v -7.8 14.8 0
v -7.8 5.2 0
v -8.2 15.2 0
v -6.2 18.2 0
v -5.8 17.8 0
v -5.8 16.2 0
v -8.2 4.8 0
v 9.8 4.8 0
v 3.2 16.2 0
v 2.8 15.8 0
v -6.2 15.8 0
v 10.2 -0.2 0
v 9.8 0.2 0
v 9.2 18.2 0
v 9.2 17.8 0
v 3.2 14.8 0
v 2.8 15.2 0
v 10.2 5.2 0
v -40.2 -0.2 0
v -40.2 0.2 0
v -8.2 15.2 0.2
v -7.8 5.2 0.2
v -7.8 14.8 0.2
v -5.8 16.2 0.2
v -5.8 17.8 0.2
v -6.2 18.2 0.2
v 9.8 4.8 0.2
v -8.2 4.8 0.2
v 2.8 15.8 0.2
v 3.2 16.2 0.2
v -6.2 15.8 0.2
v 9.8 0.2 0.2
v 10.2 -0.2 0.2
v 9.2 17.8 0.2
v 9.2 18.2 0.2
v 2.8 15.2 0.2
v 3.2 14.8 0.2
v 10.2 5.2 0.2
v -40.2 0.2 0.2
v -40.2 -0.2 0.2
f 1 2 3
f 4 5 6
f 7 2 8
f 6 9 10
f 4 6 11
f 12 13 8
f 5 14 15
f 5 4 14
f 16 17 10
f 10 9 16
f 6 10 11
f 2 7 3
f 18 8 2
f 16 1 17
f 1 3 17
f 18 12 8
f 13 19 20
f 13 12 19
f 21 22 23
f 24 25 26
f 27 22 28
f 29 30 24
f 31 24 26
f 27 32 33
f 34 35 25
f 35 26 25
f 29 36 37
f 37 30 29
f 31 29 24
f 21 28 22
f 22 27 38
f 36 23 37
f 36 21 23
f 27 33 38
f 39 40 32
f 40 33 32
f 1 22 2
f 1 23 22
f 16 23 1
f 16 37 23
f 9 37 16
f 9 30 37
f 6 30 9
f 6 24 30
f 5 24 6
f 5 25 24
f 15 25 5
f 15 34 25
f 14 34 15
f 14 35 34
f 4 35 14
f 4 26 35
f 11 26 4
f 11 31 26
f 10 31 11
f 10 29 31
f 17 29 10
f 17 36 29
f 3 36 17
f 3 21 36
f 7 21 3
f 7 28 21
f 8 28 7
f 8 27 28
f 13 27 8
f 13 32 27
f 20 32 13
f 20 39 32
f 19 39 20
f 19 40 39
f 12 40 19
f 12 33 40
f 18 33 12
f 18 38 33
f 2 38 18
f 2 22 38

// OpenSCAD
// file: ../../api/v2/reporting.scad
//////////////////////////////////////////////////////////////////////
// LibFile: reporting.scad
// Project: Grid Stack
// FileGroup: API v2 Reporting
// FileSummary: Console report for immutable primitive-trace print recipes.
// Role: Makes the exact material, nozzle, printer status, layer height,
//       trace lengths, repeat distances, and source identity visible.
// Requires: API v2 indexes and parallel-trace/path helpers.
// Exports: report_first_layer_object().
//////////////////////////////////////////////////////////////////////

module report_first_layer_object(object, report_level = "full") {
    material = object[FLO_MATERIAL];
    nozzle = object[FLO_NOZZLE];
    printer = object[FLO_PRINTER];
    process = object[FLO_PROCESS];
    traces = object[FLO_TRACES];
    orientation = object[FLO_ORIENTATION];
    lead_in = object[FLO_LEAD_IN];
    points = parallel_trace_path(traces, orientation, lead_in);

    assert(report_level == "summary" || report_level == "full",
        "Report level must be summary or full.");

    echo("------------------------------------------------------------");
    echo("GRID STACK API V2 SAVED FIRST-LAYER OBJECT");
    echo(str("Object: ", object[FLO_NAME]));
    echo(str("Revision: ", object[FLO_REVISION]));
    echo(str("Source release: ", object[FLO_SOURCE_RELEASE]));
    echo(str("Source commit: ", object[FLO_SOURCE_COMMIT]));
    echo(str("Status: ", object[FLO_STATUS]));
    echo(str("Material: ", material[MAT_FAMILY]));
    echo(str("Nozzle: ", nozzle[NZ_DIAMETER], " mm"));
    echo(str("Layer height: ", process[TP_LAYER_H], " mm"));
    echo(str("Printer record: ", printer[PRN_NAME],
        " (", printer[PRN_STATUS], ")"));
    echo(str("Trace orientation: ", orientation, " degrees"));
    echo(str("Trace count: ", len(traces)));
    echo(str("Trace lengths: ", parallel_trace_lengths(traces)));
    echo(str("Repeat distances: ", trace_repeat_distances(traces)));
    echo(str("Clear gaps: ",
        trace_clear_gaps(traces, nozzle[NZ_DIAMETER])));
    echo(str("Lead-in: ", lead_in, " mm"));
    echo(str("Continuous path length: ", path_length(points), " mm"));

    if (report_level == "full") {
        echo(str("Material record: ", material));
        echo(str("Nozzle record: ", nozzle));
        echo(str("Printer record: ", printer));
        echo(str("Trace-process record: ", process));
        echo(str("Trace records: ", traces));
        echo(str("Ordered path: ", points));
        echo(str("Notes: ", object[FLO_NOTES]));
    }

    echo("------------------------------------------------------------");
}
// file: ../../api/v2/validation.scad
//////////////////////////////////////////////////////////////////////
// LibFile: validation.scad
// Project: Grid Stack
// FileGroup: API v2 Validation
// FileSummary: Validates immutable primitive-trace print recipes.
// Role: Rejects incomplete environments, nonparallel traces, diagonal turns,
//       incompatible API/schema versions, and misleading print records.
// Requires: API v2 indexes, path math, and parallel-trace helpers.
// Exports: validate_first_layer_object().
//////////////////////////////////////////////////////////////////////

function _v2_is_integer(value) = is_num(value) && floor(value) == value;

module _validate_material(material) {
    assert(len(material) == 5,
        "API v2 material record has an unexpected field count.");
    assert(material[MAT_NAME] != "", "Material name cannot be empty.");
    assert(material[MAT_STATUS] == "in_use" ||
           material[MAT_STATUS] == "retired",
        "Material status must be in_use or retired.");
}

module _validate_nozzle(nozzle) {
    assert(len(nozzle) == 5,
        "API v2 nozzle record has an unexpected field count.");
    assert(nozzle[NZ_NAME] != "", "Nozzle name cannot be empty.");
    assert(nozzle[NZ_DIAMETER] > 0,
        "Nozzle diameter must be positive.");
    assert(nozzle[NZ_STATUS] == "in_use" ||
           nozzle[NZ_STATUS] == "retired",
        "Nozzle status must be in_use or retired.");
}

module _validate_printer(printer) {
    assert(len(printer) == 7,
        "API v2 printer record has an unexpected field count.");
    assert(printer[PRN_NAME] != "", "Printer name cannot be empty.");
    assert(printer[PRN_STATUS] == "recorded" ||
           printer[PRN_STATUS] == "unrecorded" ||
           printer[PRN_STATUS] == "retired",
        "Printer status must be recorded, unrecorded, or retired.");

    if (printer[PRN_STATUS] == "recorded") {
        assert(printer[PRN_MANUFACTURER] != "",
            "A recorded printer requires a manufacturer.");
        assert(printer[PRN_MODEL] != "",
            "A recorded printer requires a model.");
    }
}

module _validate_trace_process(process, material, nozzle, printer) {
    assert(len(process) == 8,
        "API v2 trace-process record has an unexpected field count.");
    assert(process[TP_NAME] != "",
        "Trace-process name cannot be empty.");
    assert(process[TP_MATERIAL] == material[MAT_NAME],
        "Trace process material does not match the embedded material.");
    assert(process[TP_NOZZLE] == nozzle[NZ_NAME],
        "Trace process nozzle does not match the embedded nozzle.");
    assert(process[TP_PRINTER] == printer[PRN_NAME],
        "Trace process printer does not match the embedded printer.");
    assert(process[TP_LAYER_H] > 0,
        "Deposited layer height must be positive.");
    assert(process[TP_LAYER_H] <= nozzle[NZ_DIAMETER],
        "Deposited layer height must not exceed nozzle diameter.");
    assert(process[TP_QUALIFICATION] == "owner_tested" ||
           process[TP_QUALIFICATION] == "unqualified",
        "Trace-process qualification must be owner_tested or unqualified.");
    assert(_v2_is_integer(process[TP_REVISION]) &&
           process[TP_REVISION] >= 1,
        "Trace-process revision must be a positive integer.");
}

module _validate_parallel_traces(traces, orientation, trace_width, lead_in) {
    assert(len(traces) >= 1,
        "At least one parallel trace must be configured.");
    assert(orientation == 0 || orientation == 90,
        "Trace orientation must be 0 or 90 degrees.");
    assert(trace_width > 0,
        "Trace width must be positive.");
    assert(lead_in >= 0,
        "Lead-in must be zero or positive.");

    for (i = [0 : len(traces) - 1]) {
        trace = traces[i];
        assert(len(trace) == 3,
            str("Trace ", i,
                " must be [axis_min, axis_max, perpendicular_position]."));
        assert(is_num(trace[PTR_AXIS_MIN]) &&
               is_num(trace[PTR_AXIS_MAX]) &&
               is_num(trace[PTR_OFFSET]),
            str("Trace ", i, " fields must be numeric."));
        assert(trace[PTR_AXIS_MAX] > trace[PTR_AXIS_MIN],
            str("Trace ", i,
                " axis_max must be greater than axis_min."));
    }

    if (len(traces) >= 2) {
        offset_direction = traces[1][PTR_OFFSET] > traces[0][PTR_OFFSET]
            ? 1 : -1;

        for (i = [0 : len(traces) - 2]) {
            repeat_distance = abs(
                traces[i + 1][PTR_OFFSET] - traces[i][PTR_OFFSET]
            );
            next_direction = traces[i + 1][PTR_OFFSET] -
                             traces[i][PTR_OFFSET];

            assert(next_direction * offset_direction > 0,
                "Parallel-trace offsets must remain strictly monotonic.");
            assert(repeat_distance >= trace_width,
                str("Trace repeat distance ", repeat_distance,
                    " is smaller than trace width ", trace_width, "."));
            assert(nearly_equal(
                    trace_path_end_axis(traces[i], i),
                    trace_path_start_axis(traces[i + 1], i + 1)
                ),
                str("Traces ", i, " and ", i + 1,
                    " do not share the endpoint required for a square turn."));
        }
    }

    points = parallel_trace_path(traces, orientation, lead_in);
    assert(len(points) >= 2,
        "Generated path requires at least two points.");
    assert(!path_has_zero_length_segment(points),
        "Generated path contains a zero-length segment.");
    assert(path_is_axis_aligned(points),
        "Generated path must remain axis-aligned.");
    assert(path_start(points) != path_end(points),
        "Generated path must remain open.");
}

// Module: validate_first_layer_object()
// Synopsis: Validates one API v2 immutable first-layer recipe.
module validate_first_layer_object(object) {
    assert(len(object) == 15,
        "API v2 first-layer object has an unexpected field count.");
    assert(object[FLO_NAME] != "",
        "First-layer object name must not be empty.");
    assert(_v2_is_integer(object[FLO_REVISION]) &&
           object[FLO_REVISION] >= 1,
        "First-layer object revision must be a positive integer.");
    assert(object[FLO_REQUIRED_API] == GRID_STACK_API_VERSION,
        str("Recipe requires Grid Stack API ",
            object[FLO_REQUIRED_API], " but loaded API is ",
            GRID_STACK_API_VERSION, "."));
    assert(object[FLO_SCHEMA_VERSION] ==
           GRID_STACK_FIRST_LAYER_SCHEMA_VERSION,
        str("Recipe schema ", object[FLO_SCHEMA_VERSION],
            " is incompatible with loaded schema ",
            GRID_STACK_FIRST_LAYER_SCHEMA_VERSION, "."));
    assert(object[FLO_SOURCE_RELEASE] != "",
        "Recipe must record its source release.");
    assert(object[FLO_SOURCE_COMMIT] != "",
        "Recipe must record its accepted source commit.");
    assert(object[FLO_STATUS] == "calibration" ||
           object[FLO_STATUS] == "printed" ||
           object[FLO_STATUS] == "retired",
        "Recipe status must be calibration, printed, or retired.");

    material = object[FLO_MATERIAL];
    nozzle = object[FLO_NOZZLE];
    printer = object[FLO_PRINTER];
    process = object[FLO_PROCESS];

    _validate_material(material);
    _validate_nozzle(nozzle);
    _validate_printer(printer);
    _validate_trace_process(process, material, nozzle, printer);
    _validate_parallel_traces(
        object[FLO_TRACES],
        object[FLO_ORIENTATION],
        nozzle[NZ_DIAMETER],
        object[FLO_LEAD_IN]
    );

    if (object[FLO_STATUS] == "printed")
        assert(process[TP_QUALIFICATION] == "owner_tested",
            "A printed recipe must use an owner-tested trace process.");

    echo("GRID STACK API V2 FIRST-LAYER VALIDATION: PASS");
}
// file: ../../geometry/trace_layer.scad
//////////////////////////////////////////////////////////////////////
// LibFile: trace_layer.scad
// Project: Grid Stack
// FileGroup: Printable Geometry
// FileSummary: Sweeps one rectangular nozzle trace along an axis-aligned path
//              using square segment ends and square perpendicular turns.
// Role: Creates the first printable Grid Stack primitive: one trace wide and
//       one deposited layer high. It is not a structural strand.
// Requires: An ordered, validated, axis-aligned XY point list.
// Exports: square_trace_path_2d() and printable_trace_layer().
//////////////////////////////////////////////////////////////////////

// Module: _square_trace_segment_2d()
// Synopsis: Creates one centered axis-aligned segment with square end caps.
module _square_trace_segment_2d(a, b, width) {
    horizontal = nearly_equal(a[1], b[1]);
    vertical = nearly_equal(a[0], b[0]);

    assert(horizontal || vertical,
        "Printable trace segments must be horizontal or vertical.");
    assert(!nearly_equal(point_distance_2d(a, b), 0),
        "Printable trace segments must have nonzero length.");

    if (horizontal)
        translate([min(a[0], b[0]) - width / 2, a[1] - width / 2])
            square([abs(b[0] - a[0]) + width, width]);
    else
        translate([a[0] - width / 2, min(a[1], b[1]) - width / 2])
            square([width, abs(b[1] - a[1]) + width]);
}

// Module: square_trace_path_2d()
// Synopsis: Unions square-ended segments into one continuous 2D trace.
module square_trace_path_2d(points, width) {
    assert(len(points) >= 2,
        "A printable trace path requires at least two points.");
    assert(width > 0,
        "Printable trace width must be positive.");

    union()
        for (i = [0 : len(points) - 2])
            _square_trace_segment_2d(points[i], points[i + 1], width);
}

// Module: printable_trace_layer()
// Synopsis: Extrudes one trace-width path to one deposited-layer height.
// Description:
//   The start, termination, and every perpendicular turn remain square.
//   This primitive intentionally represents one nozzle trace and one layer.
module printable_trace_layer(points, trace_width, trace_height) {
    assert(trace_height > 0,
        "Printable trace height must be positive.");

    linear_extrude(height = trace_height, convexity = 10)
        square_trace_path_2d(points, trace_width);
}
// file: ../../geometry/path_preview.scad
//////////////////////////////////////////////////////////////////////
// LibFile: path_preview.scad
// Project: Grid Stack
// FileGroup: Diagnostic Geometry
// FileSummary: Displays an ordered centerline, point order, start/end markers,
//              and the non-printing coupon envelope.
// Role: Supports path inspection only. It is not structural-strand geometry.
// Requires: An ordered list of XY points.
// Exports: diagnostic_path_preview().
//////////////////////////////////////////////////////////////////////

module _preview_segment_2d(a, b, width) {
    hull() {
        translate(a) circle(d = width, $fn = 16);
        translate(b) circle(d = width, $fn = 16);
    }
}

module _preview_polyline_2d(points, width) {
    for (i = [0 : len(points) - 2])
        _preview_segment_2d(points[i], points[i + 1], width);
}

module _preview_point_label(point, index, label_size) {
    translate([point[0] + label_size * 0.35, point[1] + label_size * 0.15])
        text(str(index), size = label_size, halign = "left", valign = "bottom");
}

// Module: diagnostic_path_preview()
// Synopsis: Renders a deliberately thin, non-printable path diagnostic.
// Description:
//   Point 0 is the lead-in start. The last point is the only path end.
//   The translucent rectangle is an envelope reference, not a perimeter path.
module diagnostic_path_preview(
    points,
    boundary_size,
    show_envelope = true,
    show_point_numbers = true,
    line_width = 0.18,
    marker_diameter = 1.2,
    label_size = 1.5
) {
    if (show_envelope)
        %color([0.75, 0.75, 0.75, 0.25])
            linear_extrude(height = 0.02)
                square(boundary_size);

    color("orange")
        linear_extrude(height = 0.08)
            _preview_polyline_2d(points, line_width);

    color("green")
        translate([points[0][0], points[0][1], 0])
            cylinder(h = 0.12, d = marker_diameter, $fn = 24);

    color("red")
        translate([points[len(points) - 1][0], points[len(points) - 1][1], 0])
            cylinder(h = 0.12, d = marker_diameter, $fn = 24);

    if (show_point_numbers)
        color("black")
            linear_extrude(height = 0.1)
                for (i = [0 : len(points) - 1])
                    _preview_point_label(points[i], i, label_size);
}
// file: ../../paths/parallel_traces.scad
//////////////////////////////////////////////////////////////////////
// LibFile: parallel_traces.scad
// Project: Grid Stack
// FileGroup: Path Generation
// FileSummary: Converts configurable parallel-trace records into one ordered,
//              continuous path with square perpendicular connectors.
// Role: Treats every trace length and repeat distance as independent data.
//       No equal spacing, equal length, symmetry, or square-wave repetition is
//       implied by this generator.
// Requires: Path mathematics and parallel-trace field indexes.
// Exports: parallel_trace_path(), trace_axis_length(), trace_repeat_distances(),
//          trace_clear_gaps(), and trace-path endpoint helpers.
//////////////////////////////////////////////////////////////////////

// Function: trace_axis_length()
// Synopsis: Returns the independently configured length of one parallel trace.
function trace_axis_length(trace) = trace[PTR_AXIS_MAX] - trace[PTR_AXIS_MIN];

// Function: trace_path_start_axis()
// Synopsis: Returns the traversal start coordinate for a trace by parity.
// Description:
//   Even traces run from axis_min to axis_max. Odd traces run from axis_max
//   to axis_min. This alternation preserves one continuous serpentine path.
function trace_path_start_axis(trace, index) =
    index % 2 == 0 ? trace[PTR_AXIS_MIN] : trace[PTR_AXIS_MAX];

// Function: trace_path_end_axis()
// Synopsis: Returns the traversal end coordinate for a trace by parity.
function trace_path_end_axis(trace, index) =
    index % 2 == 0 ? trace[PTR_AXIS_MAX] : trace[PTR_AXIS_MIN];

// Function: _parallel_trace_point()
// Synopsis: Maps one axis coordinate and one perpendicular offset into XY.
function _parallel_trace_point(axis_value, offset, orientation) =
    orientation == 0 ? [axis_value, offset] : [offset, axis_value];

// Function: _parallel_trace_points()
// Synopsis: Recursively expands trace records into entry and exit points.
function _parallel_trace_points(traces, orientation, index = 0) =
    index >= len(traces)
        ? []
        : let(
            trace = traces[index],
            offset = trace[PTR_OFFSET],
            start_point = _parallel_trace_point(
                trace_path_start_axis(trace, index), offset, orientation
            ),
            end_point = _parallel_trace_point(
                trace_path_end_axis(trace, index), offset, orientation
            )
        )
        concat(
            [start_point, end_point],
            _parallel_trace_points(traces, orientation, index + 1)
        );

// Function: parallel_trace_path()
// Synopsis: Returns one open ordered path through all configured traces.
// Arguments:
//   traces = Records of [axis_min, axis_max, perpendicular_position].
//   orientation = 0 for X-running traces or 90 for Y-running traces.
//   lead_in = Straight entry length before the first trace, in millimeters.
// Description:
//   Adjacent records must share the alternating endpoint used by their turn.
//   The path therefore connects traces only with perpendicular square turns.
//   Every trace length and every offset difference may be different.
function parallel_trace_path(traces, orientation = 0, lead_in = 0) =
    assert(len(traces) >= 1,
        "A parallel-trace path requires at least one trace record.")
    assert(orientation == 0 || orientation == 90,
        "Parallel-trace orientation must be 0 or 90 degrees.")
    assert(lead_in >= 0,
        "Parallel-trace lead-in must be zero or positive.")
    let(
        body = _parallel_trace_points(traces, orientation),
        first = body[0],
        lead_start = orientation == 0
            ? [first[0] - lead_in, first[1]]
            : [first[0], first[1] - lead_in]
    )
    lead_in > 0 ? concat([lead_start], body) : body;

// Function: trace_repeat_distances()
// Synopsis: Returns centerline-to-centerline repeat distances between traces.
function trace_repeat_distances(traces) =
    len(traces) < 2
        ? []
        : [for (i = [0 : len(traces) - 2])
            abs(traces[i + 1][PTR_OFFSET] - traces[i][PTR_OFFSET])];

// Function: trace_clear_gaps()
// Synopsis: Returns clear edge-to-edge gaps for a specified trace width.
function trace_clear_gaps(traces, trace_width) =
    [for (distance = trace_repeat_distances(traces))
        distance - trace_width];

// Function: parallel_trace_lengths()
// Synopsis: Returns the independently configured lengths of all traces.
function parallel_trace_lengths(traces) =
    [for (trace = traces) trace_axis_length(trace)];

// Function: path_bounds_2d()
// Synopsis: Returns [min_x, max_x, min_y, max_y] for an ordered XY path.
function path_bounds_2d(points) = [
    min([for (point = points) point[0]]),
    max([for (point = points) point[0]]),
    min([for (point = points) point[1]]),
    max([for (point = points) point[1]])
];
// file: ../../lib/path_math.scad
//////////////////////////////////////////////////////////////////////
// LibFile: path_math.scad
// Project: Grid Stack
// FileGroup: Path Mathematics
// FileSummary: Pure helpers for ordered two-dimensional nozzle paths.
// Role: Measures and inspects point lists without creating geometry or
//       selecting project records.
// Requires: nearly_equal() from list_math.scad.
// Exports: Point, segment, path-length, and continuity helpers.
//////////////////////////////////////////////////////////////////////

// Function: point_distance_2d()
// Synopsis: Returns the Euclidean distance between two XY points.
function point_distance_2d(a, b) =
    sqrt(pow(b[0] - a[0], 2) + pow(b[1] - a[1], 2));

// Function: segment_is_axis_aligned()
// Synopsis: True when a segment is horizontal or vertical.
function segment_is_axis_aligned(a, b) =
    nearly_equal(a[0], b[0]) || nearly_equal(a[1], b[1]);

// Function: path_segment_lengths()
// Synopsis: Returns one length for every consecutive point pair.
function path_segment_lengths(points) =
    len(points) < 2
        ? []
        : [for (i = [0 : len(points) - 2])
            point_distance_2d(points[i], points[i + 1])];

// Function: path_length()
// Synopsis: Returns the total centerline length of an ordered path.
function path_length(points, i = 0) =
    i >= len(points) - 1
        ? 0
        : point_distance_2d(points[i], points[i + 1]) +
          path_length(points, i + 1);

// Function: path_has_zero_length_segment()
// Synopsis: Detects repeated consecutive points.
function path_has_zero_length_segment(points, i = 0) =
    i >= len(points) - 1
        ? false
        : nearly_equal(point_distance_2d(points[i], points[i + 1]), 0)
            ? true
            : path_has_zero_length_segment(points, i + 1);

// Function: path_is_axis_aligned()
// Synopsis: Verifies that every segment is horizontal or vertical.
function path_is_axis_aligned(points, i = 0) =
    i >= len(points) - 1
        ? true
        : segment_is_axis_aligned(points[i], points[i + 1]) &&
          path_is_axis_aligned(points, i + 1);

function path_start(points) = points[0];
function path_end(points) = points[len(points) - 1];
// file: ../../lib/list_math.scad
//////////////////////////////////////////////////////////////////////
// LibFile: list_math.scad
// Project: Grid Stack
// FileGroup: Utilities
// FileSummary: Small pure list and numeric helpers.
// Role: Supplies generic operations with no configuration lookup or geometry.
// Exports: sum_values(), nearly_equal(), is_integer_value(), reversed().
//////////////////////////////////////////////////////////////////////

function sum_values(values, index = 0) =
    index >= len(values) ? 0 : values[index] + sum_values(values, index + 1);

function nearly_equal(a, b, tolerance = 0.0001) = abs(a - b) <= tolerance;

function is_integer_value(value) = nearly_equal(value, round(value));

function reversed(values) =
    len(values) == 0 ? [] :
    [for (index = [len(values) - 1 : -1 : 0]) values[index]];
// file: ../../api/v2/schema.scad
//////////////////////////////////////////////////////////////////////
// LibFile: schema.scad
// Project: Grid Stack
// FileGroup: API v2 Data Model
// FileSummary: Constructors for immutable first-layer printing records.
// Role: Separates a primitive nozzle trace from the API v1 structural-strand
//       process, which contains bridge and multi-pass fields irrelevant to a
//       one-layer calibration or anti-warp underlay.
// Exports: material_spec(), nozzle_spec(), printer_spec(),
//          trace_process_profile(), and first_layer_object().
//////////////////////////////////////////////////////////////////////

// Function: material_spec()
// Synopsis: Constructs one exact material-family identity.
function material_spec(name, family, flexibility, status, notes = "") =
    [name, family, flexibility, status, notes];

// Function: nozzle_spec()
// Synopsis: Constructs one exact nozzle-hardware identity.
function nozzle_spec(name, diameter, construction, status, notes = "") =
    [name, diameter, construction, status, notes];

// Function: printer_spec()
// Synopsis: Constructs one printer-hardware identity.
// Description:
//   Use a stable local name even when full hardware details are unavailable.
//   An explicitly unrecorded printer is preferable to inventing a model.
function printer_spec(
    name,
    manufacturer,
    model,
    motion_system,
    build_surface,
    status,
    notes = ""
) = [
    name,
    manufacturer,
    model,
    motion_system,
    build_surface,
    status,
    notes
];

// Function: trace_process_profile()
// Synopsis: Constructs a qualified primitive-trace printing environment.
// Description:
//   This record intentionally excludes structural width passes, structural
//   height passes, and bridge limits. One primitive trace is defined only by
//   material, nozzle, printer, and deposited layer height.
function trace_process_profile(
    name,
    material_name,
    nozzle_name,
    printer_name,
    layer_height,
    qualification,
    revision,
    notes = ""
) = [
    name,
    material_name,
    nozzle_name,
    printer_name,
    layer_height,
    qualification,
    revision,
    notes
];

// Function: first_layer_object()
// Synopsis: Constructs one immutable first-layer geometry recipe.
// Description:
//   traces contains [axis_min, axis_max, perpendicular_position] records.
//   source_commit identifies the accepted source state from which this recipe
//   was promoted. A changed printed object receives a new file and revision.
function first_layer_object(
    name,
    revision,
    required_api_version,
    first_layer_schema_version,
    source_release,
    source_commit,
    material,
    nozzle,
    printer,
    process,
    traces,
    orientation,
    lead_in,
    status,
    notes = ""
) = [
    name,
    revision,
    required_api_version,
    first_layer_schema_version,
    source_release,
    source_commit,
    material,
    nozzle,
    printer,
    process,
    traces,
    orientation,
    lead_in,
    status,
    notes
];
// file: ../../api/v2/indices.scad
//////////////////////////////////////////////////////////////////////
// LibFile: indices.scad
// Project: Grid Stack
// FileGroup: API v2 Data Model
// FileSummary: Field indexes for immutable first-layer print records.
// Role: Keeps API v2 records readable without coupling them to the older
//       structural-strand schema used by Grid Stack API version 1.
// Exports: Material, nozzle, printer, trace-process, parallel-trace, and
//          saved first-layer field-index constants.
//////////////////////////////////////////////////////////////////////

// Material identity
MAT_NAME = 0;
MAT_FAMILY = 1;
MAT_FLEXIBILITY = 2;
MAT_STATUS = 3;
MAT_NOTES = 4;

// Nozzle hardware
NZ_NAME = 0;
NZ_DIAMETER = 1;
NZ_CONSTRUCTION = 2;
NZ_STATUS = 3;
NZ_NOTES = 4;

// Printer hardware
PRN_NAME = 0;
PRN_MANUFACTURER = 1;
PRN_MODEL = 2;
PRN_MOTION_SYSTEM = 3;
PRN_BUILD_SURFACE = 4;
PRN_STATUS = 5;
PRN_NOTES = 6;

// Single-trace process
TP_NAME = 0;
TP_MATERIAL = 1;
TP_NOZZLE = 2;
TP_PRINTER = 3;
TP_LAYER_H = 4;
TP_QUALIFICATION = 5;
TP_REVISION = 6;
TP_NOTES = 7;

// Parallel-trace record
PTR_AXIS_MIN = 0;
PTR_AXIS_MAX = 1;
PTR_OFFSET = 2;

// Saved first-layer object
FLO_NAME = 0;
FLO_REVISION = 1;
FLO_REQUIRED_API = 2;
FLO_SCHEMA_VERSION = 3;
FLO_SOURCE_RELEASE = 4;
FLO_SOURCE_COMMIT = 5;
FLO_MATERIAL = 6;
FLO_NOZZLE = 7;
FLO_PRINTER = 8;
FLO_PROCESS = 9;
FLO_TRACES = 10;
FLO_ORIENTATION = 11;
FLO_LEAD_IN = 12;
FLO_STATUS = 13;
FLO_NOTES = 14;
// file: ../../api/grid_stack_v2.scad
//////////////////////////////////////////////////////////////////////
// LibFile: grid_stack_v2.scad
// Project: Grid Stack
// FileGroup: Versioned Public Interface
// FileSummary: Immutable API version 2 for primitive first-layer print
//              recipes with material, nozzle, printer, and trace-process data.
// Role: Lets saved first-layer objects avoid the structural-strand process
//       fields required by API version 1 while preserving the v1 interface.
// Exports: API/schema constants, record constructors,
//          validate_first_layer_object(), report_first_layer_object(), and
//          first_layer_render().
//////////////////////////////////////////////////////////////////////

GRID_STACK_API_VERSION = 2;
GRID_STACK_FIRST_LAYER_SCHEMA_VERSION = 2;
GRID_STACK_RELEASE = "0.7.0";

include <v2/indices.scad>
include <v2/schema.scad>

include <../lib/list_math.scad>
include <../lib/path_math.scad>
include <../paths/parallel_traces.scad>
include <../geometry/path_preview.scad>
include <../geometry/trace_layer.scad>

include <v2/validation.scad>
include <v2/reporting.scad>

// Module: first_layer_render()
// Synopsis: Validates, reports, and renders one API v2 first-layer recipe.
// Arguments:
//   object = Record returned by first_layer_object().
//   mode = trace_layer, path_debug, or report_only.
//   report_level = summary or full.
//   show_path_point_numbers = Diagnostic-only point labels.
module first_layer_render(
    object,
    mode = "trace_layer",
    report_level = "full",
    show_path_point_numbers = true
) {
    validate_first_layer_object(object);
    report_first_layer_object(object, report_level);

    nozzle = object[FLO_NOZZLE];
    process = object[FLO_PROCESS];
    points = parallel_trace_path(
        object[FLO_TRACES],
        object[FLO_ORIENTATION],
        object[FLO_LEAD_IN]
    );

    if (mode == "trace_layer")
        printable_trace_layer(
            points = points,
            trace_width = nozzle[NZ_DIAMETER],
            trace_height = process[TP_LAYER_H]
        );
    else if (mode == "path_debug")
        diagnostic_path_preview(
            points = points,
            boundary_size = [0, 0],
            show_envelope = false,
            show_point_numbers = show_path_point_numbers
        );
    else if (mode == "report_only")
        echo("Grid Stack API v2 report-only mode: no geometry generated.");
    else
        assert(false, str("Unknown API v2 first-layer mode: ", mode));
}
// main file
//////////////////////////////////////////////////////////////////////
// LibFile: first-layer-0u2Z-variable-50x18-tpu-0p4-v1.scad
// Project: Grid Stack
// FileGroup: Immutable Printed Object
// FileSummary: Exact TPU 0.4 mm nozzle, 0.2 mm layer recipe for the accepted
//              five-trace variable first-layer calibration/underlay object.
// Role: Permanently reconstructs the reported successful TPU print without
//       Customizer state or mutable catalog lookup.
// SourceCommit: 79f36da
// Requires: Grid Stack API version 2 and first-layer schema version 2.
// Output: One continuous 0.4 mm wide by 0.2 mm high trace layer.
//////////////////////////////////////////////////////////////////////

include <../../api/grid_stack_v2.scad>

assert(GRID_STACK_API_VERSION == 2,
    "This recipe requires Grid Stack API version 2.");
assert(GRID_STACK_FIRST_LAYER_SCHEMA_VERSION == 2,
    "This recipe requires first-layer schema version 2.");

saved_material = material_spec(
    name = "TPU",
    family = "TPU",
    flexibility = "flexible",
    status = "in_use",
    notes = "Material family reported successful for this first-layer object."
);

saved_nozzle = nozzle_spec(
    name = "BRASS_0P4",
    diameter = 0.4,
    construction = "brass",
    status = "in_use",
    notes = "Exact nominal nozzle diameter used by the geometry recipe."
);

saved_printer = printer_spec(
    name = "UNRECORDED_PRINTER_R1",
    manufacturer = "",
    model = "",
    motion_system = "",
    build_surface = "",
    status = "unrecorded",
    notes = "The successful printer hardware was not identified when this recipe was promoted."
);

saved_process = trace_process_profile(
    name = "TPU_0P4_LH0P2_TRACE_R1",
    material_name = "TPU",
    nozzle_name = "BRASS_0P4",
    printer_name = "UNRECORDED_PRINTER_R1",
    layer_height = 0.2,
    qualification = "owner_tested",
    revision = 1,
    notes = "Primitive trace process only; no structural-strand or bridge claim."
);

saved_traces = [
    [-10, 10,  0],
    [ -8, 10,  5],
    [ -8,  3, 15],
    [ -6,  3, 16],
    [ -6,  9, 18]
];

saved_first_layer = first_layer_object(
    name = "FIRST_LAYER_0U2Z_VARIABLE_50X18_TPU_0P4_V1",
    revision = 1,
    required_api_version = 2,
    first_layer_schema_version = 2,
    source_release = "0.7.0",
    source_commit = "79f36da",
    material = saved_material,
    nozzle = saved_nozzle,
    printer = saved_printer,
    process = saved_process,
    traces = saved_traces,
    orientation = 0,
    lead_in = 30,
    status = "printed",
    notes = "Reported successful in TPU. Create a new file and revision for any change."
);

first_layer_render(
    saved_first_layer,
    mode = "trace_layer",
    report_level = "full",
    show_path_point_numbers = false
);
